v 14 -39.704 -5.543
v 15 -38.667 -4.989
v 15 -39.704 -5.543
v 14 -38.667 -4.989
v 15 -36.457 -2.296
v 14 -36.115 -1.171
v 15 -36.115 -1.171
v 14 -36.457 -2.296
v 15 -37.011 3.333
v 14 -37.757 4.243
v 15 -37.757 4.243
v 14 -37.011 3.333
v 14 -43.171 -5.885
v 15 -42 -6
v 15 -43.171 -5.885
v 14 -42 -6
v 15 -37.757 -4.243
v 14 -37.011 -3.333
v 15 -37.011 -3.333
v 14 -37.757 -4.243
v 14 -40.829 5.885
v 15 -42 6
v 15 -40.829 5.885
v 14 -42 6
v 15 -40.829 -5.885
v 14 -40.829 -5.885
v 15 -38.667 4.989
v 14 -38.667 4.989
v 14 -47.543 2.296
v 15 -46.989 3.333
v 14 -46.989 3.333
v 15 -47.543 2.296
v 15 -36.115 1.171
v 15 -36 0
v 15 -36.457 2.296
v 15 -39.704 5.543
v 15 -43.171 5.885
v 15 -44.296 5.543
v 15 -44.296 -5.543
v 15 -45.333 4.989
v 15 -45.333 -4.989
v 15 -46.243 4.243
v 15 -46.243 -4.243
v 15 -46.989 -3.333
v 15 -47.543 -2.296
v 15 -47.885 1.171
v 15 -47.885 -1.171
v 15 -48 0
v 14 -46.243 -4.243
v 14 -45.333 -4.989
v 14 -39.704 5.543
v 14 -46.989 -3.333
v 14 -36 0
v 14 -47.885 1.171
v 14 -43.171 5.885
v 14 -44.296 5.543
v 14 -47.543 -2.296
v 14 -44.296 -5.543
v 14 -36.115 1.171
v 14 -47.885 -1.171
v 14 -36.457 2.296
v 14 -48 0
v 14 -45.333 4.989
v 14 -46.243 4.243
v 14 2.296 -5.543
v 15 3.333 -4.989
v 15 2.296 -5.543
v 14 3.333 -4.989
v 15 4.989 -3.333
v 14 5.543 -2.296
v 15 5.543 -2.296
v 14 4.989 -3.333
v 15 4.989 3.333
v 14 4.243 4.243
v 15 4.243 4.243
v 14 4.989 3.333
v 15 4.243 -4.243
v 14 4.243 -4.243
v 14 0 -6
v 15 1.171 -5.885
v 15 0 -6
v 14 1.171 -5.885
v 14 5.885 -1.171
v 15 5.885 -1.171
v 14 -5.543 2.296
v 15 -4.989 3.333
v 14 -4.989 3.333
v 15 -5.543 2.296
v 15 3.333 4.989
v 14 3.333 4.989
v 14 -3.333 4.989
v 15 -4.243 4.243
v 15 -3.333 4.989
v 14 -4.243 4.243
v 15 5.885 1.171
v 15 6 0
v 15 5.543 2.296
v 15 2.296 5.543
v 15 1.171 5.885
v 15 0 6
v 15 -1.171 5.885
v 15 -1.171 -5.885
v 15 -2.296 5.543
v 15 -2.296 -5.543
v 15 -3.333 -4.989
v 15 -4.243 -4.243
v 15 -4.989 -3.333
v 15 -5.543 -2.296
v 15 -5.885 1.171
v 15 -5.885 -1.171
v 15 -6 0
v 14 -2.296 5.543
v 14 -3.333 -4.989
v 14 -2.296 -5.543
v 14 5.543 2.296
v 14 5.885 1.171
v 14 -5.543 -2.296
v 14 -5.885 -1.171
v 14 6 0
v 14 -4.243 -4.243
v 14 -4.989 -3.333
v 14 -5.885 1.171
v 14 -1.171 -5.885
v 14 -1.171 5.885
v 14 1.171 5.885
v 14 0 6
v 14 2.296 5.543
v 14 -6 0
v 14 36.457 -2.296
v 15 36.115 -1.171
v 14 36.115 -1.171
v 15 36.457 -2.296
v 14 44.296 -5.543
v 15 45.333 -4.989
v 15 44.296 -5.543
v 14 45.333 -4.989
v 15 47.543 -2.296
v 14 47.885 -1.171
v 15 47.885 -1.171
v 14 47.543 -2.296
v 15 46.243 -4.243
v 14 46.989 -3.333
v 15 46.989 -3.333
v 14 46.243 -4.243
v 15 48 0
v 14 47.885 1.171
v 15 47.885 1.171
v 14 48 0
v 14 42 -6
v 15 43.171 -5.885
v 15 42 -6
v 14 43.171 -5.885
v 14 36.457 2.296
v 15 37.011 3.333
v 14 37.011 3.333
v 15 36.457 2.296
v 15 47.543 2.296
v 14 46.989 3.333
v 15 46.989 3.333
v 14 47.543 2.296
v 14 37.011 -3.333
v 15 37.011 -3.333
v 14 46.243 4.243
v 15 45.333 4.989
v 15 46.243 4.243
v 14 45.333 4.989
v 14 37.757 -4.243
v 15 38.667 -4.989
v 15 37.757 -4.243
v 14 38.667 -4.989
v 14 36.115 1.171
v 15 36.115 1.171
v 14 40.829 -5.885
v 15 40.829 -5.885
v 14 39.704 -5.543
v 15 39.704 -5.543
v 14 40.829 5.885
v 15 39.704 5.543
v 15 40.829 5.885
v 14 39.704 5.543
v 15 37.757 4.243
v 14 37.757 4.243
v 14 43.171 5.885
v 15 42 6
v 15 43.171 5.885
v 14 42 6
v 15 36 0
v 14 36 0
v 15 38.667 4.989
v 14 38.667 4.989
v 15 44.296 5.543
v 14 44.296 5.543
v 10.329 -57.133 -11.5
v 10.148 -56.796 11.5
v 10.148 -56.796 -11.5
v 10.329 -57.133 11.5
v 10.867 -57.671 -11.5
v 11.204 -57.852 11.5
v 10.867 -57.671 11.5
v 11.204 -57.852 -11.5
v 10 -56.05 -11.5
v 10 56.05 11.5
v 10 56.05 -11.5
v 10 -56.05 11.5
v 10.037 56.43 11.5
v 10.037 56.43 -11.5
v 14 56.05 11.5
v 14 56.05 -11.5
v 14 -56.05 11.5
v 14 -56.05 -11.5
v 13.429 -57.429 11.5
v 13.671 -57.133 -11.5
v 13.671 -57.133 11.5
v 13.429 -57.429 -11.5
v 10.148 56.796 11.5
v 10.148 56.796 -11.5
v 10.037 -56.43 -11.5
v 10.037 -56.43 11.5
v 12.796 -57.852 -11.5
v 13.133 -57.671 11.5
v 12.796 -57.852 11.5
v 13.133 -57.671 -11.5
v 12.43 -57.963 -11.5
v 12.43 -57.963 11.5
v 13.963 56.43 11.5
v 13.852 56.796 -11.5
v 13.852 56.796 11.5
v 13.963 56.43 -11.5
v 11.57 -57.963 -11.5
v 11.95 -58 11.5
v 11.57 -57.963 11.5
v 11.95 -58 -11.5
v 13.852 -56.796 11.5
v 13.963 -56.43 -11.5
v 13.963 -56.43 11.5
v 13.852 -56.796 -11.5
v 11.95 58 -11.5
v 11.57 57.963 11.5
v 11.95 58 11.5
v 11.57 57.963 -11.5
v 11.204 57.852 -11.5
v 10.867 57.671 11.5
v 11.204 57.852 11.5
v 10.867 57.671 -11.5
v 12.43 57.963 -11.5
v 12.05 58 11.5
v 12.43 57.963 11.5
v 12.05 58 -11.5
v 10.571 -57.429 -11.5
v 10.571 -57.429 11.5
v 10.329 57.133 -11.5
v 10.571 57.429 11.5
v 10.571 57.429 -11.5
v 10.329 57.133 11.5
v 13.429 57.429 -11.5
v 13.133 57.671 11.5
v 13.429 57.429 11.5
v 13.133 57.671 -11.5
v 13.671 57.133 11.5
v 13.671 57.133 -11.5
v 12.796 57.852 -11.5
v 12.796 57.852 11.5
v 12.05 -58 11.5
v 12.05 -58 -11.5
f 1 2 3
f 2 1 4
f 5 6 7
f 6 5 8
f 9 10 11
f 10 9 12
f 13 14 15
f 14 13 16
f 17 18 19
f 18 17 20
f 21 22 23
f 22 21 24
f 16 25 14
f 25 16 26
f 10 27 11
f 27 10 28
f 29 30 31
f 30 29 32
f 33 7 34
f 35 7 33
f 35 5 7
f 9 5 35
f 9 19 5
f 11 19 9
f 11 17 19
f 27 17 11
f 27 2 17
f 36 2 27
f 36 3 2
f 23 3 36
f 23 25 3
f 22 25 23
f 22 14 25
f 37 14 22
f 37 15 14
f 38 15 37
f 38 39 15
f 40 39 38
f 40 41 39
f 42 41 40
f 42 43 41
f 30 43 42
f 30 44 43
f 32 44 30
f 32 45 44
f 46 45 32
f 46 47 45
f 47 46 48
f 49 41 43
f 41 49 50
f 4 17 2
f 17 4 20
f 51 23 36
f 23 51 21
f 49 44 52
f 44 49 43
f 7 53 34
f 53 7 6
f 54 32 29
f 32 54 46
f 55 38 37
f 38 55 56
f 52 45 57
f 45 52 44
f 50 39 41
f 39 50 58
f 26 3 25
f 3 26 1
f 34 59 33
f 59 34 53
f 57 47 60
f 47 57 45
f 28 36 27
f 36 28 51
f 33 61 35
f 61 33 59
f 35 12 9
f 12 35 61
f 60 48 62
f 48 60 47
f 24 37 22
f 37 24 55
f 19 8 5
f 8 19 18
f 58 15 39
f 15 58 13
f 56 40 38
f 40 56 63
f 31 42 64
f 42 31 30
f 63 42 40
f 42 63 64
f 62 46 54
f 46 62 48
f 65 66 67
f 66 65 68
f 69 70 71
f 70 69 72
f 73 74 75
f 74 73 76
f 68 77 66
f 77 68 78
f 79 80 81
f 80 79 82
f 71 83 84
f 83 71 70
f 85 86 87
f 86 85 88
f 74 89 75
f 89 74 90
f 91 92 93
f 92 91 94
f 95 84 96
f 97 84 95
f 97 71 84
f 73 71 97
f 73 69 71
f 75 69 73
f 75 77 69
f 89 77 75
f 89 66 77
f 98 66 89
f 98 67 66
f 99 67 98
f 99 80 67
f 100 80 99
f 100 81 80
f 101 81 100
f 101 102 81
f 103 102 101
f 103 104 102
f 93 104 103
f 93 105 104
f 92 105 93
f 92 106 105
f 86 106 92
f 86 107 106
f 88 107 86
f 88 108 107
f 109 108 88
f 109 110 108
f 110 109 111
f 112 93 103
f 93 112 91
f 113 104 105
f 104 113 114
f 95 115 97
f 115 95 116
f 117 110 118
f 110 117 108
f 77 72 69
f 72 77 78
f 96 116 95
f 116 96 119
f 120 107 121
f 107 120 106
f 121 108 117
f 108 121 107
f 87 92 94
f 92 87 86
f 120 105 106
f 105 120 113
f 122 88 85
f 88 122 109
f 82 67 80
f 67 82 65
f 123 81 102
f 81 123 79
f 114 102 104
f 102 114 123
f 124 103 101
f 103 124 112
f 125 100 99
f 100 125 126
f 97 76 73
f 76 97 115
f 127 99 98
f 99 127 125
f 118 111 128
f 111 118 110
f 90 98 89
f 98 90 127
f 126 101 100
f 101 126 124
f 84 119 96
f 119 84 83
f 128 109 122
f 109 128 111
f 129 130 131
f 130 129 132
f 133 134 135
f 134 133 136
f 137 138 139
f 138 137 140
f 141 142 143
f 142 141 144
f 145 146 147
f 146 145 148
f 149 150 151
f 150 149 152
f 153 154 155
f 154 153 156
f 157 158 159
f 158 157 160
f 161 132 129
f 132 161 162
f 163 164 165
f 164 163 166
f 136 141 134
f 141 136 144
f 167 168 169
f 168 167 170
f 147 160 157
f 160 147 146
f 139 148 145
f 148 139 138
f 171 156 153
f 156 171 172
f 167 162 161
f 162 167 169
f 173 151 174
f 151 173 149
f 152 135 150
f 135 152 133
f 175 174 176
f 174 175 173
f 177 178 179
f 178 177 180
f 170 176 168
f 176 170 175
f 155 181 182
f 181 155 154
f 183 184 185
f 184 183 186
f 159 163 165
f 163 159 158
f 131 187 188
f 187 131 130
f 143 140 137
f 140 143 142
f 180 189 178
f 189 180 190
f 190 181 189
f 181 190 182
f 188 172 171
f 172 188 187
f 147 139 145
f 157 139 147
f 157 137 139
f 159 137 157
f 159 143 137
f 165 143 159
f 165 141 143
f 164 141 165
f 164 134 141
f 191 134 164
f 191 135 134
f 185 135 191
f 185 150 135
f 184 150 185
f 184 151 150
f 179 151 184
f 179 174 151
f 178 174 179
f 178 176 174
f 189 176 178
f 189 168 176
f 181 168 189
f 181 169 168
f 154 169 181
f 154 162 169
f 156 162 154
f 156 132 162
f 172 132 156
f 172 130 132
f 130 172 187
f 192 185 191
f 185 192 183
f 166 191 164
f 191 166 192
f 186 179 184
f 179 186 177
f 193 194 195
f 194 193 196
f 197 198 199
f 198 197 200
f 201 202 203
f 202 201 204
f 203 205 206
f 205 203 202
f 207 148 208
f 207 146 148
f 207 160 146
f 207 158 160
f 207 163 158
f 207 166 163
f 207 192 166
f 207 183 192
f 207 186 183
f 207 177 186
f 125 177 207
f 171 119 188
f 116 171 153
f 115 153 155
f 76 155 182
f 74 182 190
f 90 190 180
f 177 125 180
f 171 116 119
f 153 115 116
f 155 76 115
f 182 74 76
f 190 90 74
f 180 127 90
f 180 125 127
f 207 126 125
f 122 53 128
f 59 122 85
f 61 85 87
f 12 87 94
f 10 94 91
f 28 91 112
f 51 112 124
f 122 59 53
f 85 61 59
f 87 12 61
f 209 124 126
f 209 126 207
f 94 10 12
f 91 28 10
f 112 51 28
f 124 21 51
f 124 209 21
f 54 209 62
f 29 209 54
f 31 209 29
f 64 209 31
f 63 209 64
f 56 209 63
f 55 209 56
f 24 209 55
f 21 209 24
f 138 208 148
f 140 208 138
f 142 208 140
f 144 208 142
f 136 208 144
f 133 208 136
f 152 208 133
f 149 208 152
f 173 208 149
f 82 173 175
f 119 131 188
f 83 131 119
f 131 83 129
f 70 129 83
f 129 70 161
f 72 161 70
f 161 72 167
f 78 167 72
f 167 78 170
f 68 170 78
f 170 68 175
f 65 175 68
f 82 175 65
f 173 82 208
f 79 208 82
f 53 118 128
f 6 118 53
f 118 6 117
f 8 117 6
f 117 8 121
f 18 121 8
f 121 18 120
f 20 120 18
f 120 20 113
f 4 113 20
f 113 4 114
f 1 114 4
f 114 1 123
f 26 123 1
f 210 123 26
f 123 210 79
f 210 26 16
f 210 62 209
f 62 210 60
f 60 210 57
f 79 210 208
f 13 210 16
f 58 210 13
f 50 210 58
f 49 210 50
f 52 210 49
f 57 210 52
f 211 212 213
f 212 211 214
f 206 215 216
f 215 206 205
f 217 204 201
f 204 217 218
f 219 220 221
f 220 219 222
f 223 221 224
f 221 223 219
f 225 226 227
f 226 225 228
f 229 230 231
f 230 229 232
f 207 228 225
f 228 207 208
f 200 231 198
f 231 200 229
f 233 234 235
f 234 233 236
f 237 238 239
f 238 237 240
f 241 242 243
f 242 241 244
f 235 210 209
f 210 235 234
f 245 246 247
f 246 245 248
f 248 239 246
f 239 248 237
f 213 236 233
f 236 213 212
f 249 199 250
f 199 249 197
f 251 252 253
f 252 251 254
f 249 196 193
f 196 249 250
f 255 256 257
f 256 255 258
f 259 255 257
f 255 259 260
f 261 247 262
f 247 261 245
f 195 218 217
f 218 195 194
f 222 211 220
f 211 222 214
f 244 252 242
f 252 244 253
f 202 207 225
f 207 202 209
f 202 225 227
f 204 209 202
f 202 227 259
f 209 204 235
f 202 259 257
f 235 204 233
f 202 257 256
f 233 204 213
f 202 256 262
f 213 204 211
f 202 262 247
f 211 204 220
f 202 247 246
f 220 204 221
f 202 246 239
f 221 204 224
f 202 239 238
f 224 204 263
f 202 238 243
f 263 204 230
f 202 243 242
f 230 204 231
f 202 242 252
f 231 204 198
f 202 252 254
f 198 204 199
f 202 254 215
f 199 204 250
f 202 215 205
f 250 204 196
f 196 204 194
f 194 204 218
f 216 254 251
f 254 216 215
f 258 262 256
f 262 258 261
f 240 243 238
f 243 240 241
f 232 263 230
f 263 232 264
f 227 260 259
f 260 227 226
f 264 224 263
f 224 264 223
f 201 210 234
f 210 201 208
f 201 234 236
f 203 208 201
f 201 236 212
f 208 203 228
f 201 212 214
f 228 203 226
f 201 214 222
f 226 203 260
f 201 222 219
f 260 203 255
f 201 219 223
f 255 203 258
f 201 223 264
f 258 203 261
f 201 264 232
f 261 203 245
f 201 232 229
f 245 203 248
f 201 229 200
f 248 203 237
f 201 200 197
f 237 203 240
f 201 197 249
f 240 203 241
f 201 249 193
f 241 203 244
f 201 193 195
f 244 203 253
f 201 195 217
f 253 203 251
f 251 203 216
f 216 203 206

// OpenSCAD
use <main.scad>
camera_pos_x        = 415;
camera_mount_height = 285;
d455_length         = 26;
d455_width          = 124;
d455_height         = 29;
show_component_labels = false;
translate([-camera_pos_x, 0, -camera_mount_height])
    realsense_face();
